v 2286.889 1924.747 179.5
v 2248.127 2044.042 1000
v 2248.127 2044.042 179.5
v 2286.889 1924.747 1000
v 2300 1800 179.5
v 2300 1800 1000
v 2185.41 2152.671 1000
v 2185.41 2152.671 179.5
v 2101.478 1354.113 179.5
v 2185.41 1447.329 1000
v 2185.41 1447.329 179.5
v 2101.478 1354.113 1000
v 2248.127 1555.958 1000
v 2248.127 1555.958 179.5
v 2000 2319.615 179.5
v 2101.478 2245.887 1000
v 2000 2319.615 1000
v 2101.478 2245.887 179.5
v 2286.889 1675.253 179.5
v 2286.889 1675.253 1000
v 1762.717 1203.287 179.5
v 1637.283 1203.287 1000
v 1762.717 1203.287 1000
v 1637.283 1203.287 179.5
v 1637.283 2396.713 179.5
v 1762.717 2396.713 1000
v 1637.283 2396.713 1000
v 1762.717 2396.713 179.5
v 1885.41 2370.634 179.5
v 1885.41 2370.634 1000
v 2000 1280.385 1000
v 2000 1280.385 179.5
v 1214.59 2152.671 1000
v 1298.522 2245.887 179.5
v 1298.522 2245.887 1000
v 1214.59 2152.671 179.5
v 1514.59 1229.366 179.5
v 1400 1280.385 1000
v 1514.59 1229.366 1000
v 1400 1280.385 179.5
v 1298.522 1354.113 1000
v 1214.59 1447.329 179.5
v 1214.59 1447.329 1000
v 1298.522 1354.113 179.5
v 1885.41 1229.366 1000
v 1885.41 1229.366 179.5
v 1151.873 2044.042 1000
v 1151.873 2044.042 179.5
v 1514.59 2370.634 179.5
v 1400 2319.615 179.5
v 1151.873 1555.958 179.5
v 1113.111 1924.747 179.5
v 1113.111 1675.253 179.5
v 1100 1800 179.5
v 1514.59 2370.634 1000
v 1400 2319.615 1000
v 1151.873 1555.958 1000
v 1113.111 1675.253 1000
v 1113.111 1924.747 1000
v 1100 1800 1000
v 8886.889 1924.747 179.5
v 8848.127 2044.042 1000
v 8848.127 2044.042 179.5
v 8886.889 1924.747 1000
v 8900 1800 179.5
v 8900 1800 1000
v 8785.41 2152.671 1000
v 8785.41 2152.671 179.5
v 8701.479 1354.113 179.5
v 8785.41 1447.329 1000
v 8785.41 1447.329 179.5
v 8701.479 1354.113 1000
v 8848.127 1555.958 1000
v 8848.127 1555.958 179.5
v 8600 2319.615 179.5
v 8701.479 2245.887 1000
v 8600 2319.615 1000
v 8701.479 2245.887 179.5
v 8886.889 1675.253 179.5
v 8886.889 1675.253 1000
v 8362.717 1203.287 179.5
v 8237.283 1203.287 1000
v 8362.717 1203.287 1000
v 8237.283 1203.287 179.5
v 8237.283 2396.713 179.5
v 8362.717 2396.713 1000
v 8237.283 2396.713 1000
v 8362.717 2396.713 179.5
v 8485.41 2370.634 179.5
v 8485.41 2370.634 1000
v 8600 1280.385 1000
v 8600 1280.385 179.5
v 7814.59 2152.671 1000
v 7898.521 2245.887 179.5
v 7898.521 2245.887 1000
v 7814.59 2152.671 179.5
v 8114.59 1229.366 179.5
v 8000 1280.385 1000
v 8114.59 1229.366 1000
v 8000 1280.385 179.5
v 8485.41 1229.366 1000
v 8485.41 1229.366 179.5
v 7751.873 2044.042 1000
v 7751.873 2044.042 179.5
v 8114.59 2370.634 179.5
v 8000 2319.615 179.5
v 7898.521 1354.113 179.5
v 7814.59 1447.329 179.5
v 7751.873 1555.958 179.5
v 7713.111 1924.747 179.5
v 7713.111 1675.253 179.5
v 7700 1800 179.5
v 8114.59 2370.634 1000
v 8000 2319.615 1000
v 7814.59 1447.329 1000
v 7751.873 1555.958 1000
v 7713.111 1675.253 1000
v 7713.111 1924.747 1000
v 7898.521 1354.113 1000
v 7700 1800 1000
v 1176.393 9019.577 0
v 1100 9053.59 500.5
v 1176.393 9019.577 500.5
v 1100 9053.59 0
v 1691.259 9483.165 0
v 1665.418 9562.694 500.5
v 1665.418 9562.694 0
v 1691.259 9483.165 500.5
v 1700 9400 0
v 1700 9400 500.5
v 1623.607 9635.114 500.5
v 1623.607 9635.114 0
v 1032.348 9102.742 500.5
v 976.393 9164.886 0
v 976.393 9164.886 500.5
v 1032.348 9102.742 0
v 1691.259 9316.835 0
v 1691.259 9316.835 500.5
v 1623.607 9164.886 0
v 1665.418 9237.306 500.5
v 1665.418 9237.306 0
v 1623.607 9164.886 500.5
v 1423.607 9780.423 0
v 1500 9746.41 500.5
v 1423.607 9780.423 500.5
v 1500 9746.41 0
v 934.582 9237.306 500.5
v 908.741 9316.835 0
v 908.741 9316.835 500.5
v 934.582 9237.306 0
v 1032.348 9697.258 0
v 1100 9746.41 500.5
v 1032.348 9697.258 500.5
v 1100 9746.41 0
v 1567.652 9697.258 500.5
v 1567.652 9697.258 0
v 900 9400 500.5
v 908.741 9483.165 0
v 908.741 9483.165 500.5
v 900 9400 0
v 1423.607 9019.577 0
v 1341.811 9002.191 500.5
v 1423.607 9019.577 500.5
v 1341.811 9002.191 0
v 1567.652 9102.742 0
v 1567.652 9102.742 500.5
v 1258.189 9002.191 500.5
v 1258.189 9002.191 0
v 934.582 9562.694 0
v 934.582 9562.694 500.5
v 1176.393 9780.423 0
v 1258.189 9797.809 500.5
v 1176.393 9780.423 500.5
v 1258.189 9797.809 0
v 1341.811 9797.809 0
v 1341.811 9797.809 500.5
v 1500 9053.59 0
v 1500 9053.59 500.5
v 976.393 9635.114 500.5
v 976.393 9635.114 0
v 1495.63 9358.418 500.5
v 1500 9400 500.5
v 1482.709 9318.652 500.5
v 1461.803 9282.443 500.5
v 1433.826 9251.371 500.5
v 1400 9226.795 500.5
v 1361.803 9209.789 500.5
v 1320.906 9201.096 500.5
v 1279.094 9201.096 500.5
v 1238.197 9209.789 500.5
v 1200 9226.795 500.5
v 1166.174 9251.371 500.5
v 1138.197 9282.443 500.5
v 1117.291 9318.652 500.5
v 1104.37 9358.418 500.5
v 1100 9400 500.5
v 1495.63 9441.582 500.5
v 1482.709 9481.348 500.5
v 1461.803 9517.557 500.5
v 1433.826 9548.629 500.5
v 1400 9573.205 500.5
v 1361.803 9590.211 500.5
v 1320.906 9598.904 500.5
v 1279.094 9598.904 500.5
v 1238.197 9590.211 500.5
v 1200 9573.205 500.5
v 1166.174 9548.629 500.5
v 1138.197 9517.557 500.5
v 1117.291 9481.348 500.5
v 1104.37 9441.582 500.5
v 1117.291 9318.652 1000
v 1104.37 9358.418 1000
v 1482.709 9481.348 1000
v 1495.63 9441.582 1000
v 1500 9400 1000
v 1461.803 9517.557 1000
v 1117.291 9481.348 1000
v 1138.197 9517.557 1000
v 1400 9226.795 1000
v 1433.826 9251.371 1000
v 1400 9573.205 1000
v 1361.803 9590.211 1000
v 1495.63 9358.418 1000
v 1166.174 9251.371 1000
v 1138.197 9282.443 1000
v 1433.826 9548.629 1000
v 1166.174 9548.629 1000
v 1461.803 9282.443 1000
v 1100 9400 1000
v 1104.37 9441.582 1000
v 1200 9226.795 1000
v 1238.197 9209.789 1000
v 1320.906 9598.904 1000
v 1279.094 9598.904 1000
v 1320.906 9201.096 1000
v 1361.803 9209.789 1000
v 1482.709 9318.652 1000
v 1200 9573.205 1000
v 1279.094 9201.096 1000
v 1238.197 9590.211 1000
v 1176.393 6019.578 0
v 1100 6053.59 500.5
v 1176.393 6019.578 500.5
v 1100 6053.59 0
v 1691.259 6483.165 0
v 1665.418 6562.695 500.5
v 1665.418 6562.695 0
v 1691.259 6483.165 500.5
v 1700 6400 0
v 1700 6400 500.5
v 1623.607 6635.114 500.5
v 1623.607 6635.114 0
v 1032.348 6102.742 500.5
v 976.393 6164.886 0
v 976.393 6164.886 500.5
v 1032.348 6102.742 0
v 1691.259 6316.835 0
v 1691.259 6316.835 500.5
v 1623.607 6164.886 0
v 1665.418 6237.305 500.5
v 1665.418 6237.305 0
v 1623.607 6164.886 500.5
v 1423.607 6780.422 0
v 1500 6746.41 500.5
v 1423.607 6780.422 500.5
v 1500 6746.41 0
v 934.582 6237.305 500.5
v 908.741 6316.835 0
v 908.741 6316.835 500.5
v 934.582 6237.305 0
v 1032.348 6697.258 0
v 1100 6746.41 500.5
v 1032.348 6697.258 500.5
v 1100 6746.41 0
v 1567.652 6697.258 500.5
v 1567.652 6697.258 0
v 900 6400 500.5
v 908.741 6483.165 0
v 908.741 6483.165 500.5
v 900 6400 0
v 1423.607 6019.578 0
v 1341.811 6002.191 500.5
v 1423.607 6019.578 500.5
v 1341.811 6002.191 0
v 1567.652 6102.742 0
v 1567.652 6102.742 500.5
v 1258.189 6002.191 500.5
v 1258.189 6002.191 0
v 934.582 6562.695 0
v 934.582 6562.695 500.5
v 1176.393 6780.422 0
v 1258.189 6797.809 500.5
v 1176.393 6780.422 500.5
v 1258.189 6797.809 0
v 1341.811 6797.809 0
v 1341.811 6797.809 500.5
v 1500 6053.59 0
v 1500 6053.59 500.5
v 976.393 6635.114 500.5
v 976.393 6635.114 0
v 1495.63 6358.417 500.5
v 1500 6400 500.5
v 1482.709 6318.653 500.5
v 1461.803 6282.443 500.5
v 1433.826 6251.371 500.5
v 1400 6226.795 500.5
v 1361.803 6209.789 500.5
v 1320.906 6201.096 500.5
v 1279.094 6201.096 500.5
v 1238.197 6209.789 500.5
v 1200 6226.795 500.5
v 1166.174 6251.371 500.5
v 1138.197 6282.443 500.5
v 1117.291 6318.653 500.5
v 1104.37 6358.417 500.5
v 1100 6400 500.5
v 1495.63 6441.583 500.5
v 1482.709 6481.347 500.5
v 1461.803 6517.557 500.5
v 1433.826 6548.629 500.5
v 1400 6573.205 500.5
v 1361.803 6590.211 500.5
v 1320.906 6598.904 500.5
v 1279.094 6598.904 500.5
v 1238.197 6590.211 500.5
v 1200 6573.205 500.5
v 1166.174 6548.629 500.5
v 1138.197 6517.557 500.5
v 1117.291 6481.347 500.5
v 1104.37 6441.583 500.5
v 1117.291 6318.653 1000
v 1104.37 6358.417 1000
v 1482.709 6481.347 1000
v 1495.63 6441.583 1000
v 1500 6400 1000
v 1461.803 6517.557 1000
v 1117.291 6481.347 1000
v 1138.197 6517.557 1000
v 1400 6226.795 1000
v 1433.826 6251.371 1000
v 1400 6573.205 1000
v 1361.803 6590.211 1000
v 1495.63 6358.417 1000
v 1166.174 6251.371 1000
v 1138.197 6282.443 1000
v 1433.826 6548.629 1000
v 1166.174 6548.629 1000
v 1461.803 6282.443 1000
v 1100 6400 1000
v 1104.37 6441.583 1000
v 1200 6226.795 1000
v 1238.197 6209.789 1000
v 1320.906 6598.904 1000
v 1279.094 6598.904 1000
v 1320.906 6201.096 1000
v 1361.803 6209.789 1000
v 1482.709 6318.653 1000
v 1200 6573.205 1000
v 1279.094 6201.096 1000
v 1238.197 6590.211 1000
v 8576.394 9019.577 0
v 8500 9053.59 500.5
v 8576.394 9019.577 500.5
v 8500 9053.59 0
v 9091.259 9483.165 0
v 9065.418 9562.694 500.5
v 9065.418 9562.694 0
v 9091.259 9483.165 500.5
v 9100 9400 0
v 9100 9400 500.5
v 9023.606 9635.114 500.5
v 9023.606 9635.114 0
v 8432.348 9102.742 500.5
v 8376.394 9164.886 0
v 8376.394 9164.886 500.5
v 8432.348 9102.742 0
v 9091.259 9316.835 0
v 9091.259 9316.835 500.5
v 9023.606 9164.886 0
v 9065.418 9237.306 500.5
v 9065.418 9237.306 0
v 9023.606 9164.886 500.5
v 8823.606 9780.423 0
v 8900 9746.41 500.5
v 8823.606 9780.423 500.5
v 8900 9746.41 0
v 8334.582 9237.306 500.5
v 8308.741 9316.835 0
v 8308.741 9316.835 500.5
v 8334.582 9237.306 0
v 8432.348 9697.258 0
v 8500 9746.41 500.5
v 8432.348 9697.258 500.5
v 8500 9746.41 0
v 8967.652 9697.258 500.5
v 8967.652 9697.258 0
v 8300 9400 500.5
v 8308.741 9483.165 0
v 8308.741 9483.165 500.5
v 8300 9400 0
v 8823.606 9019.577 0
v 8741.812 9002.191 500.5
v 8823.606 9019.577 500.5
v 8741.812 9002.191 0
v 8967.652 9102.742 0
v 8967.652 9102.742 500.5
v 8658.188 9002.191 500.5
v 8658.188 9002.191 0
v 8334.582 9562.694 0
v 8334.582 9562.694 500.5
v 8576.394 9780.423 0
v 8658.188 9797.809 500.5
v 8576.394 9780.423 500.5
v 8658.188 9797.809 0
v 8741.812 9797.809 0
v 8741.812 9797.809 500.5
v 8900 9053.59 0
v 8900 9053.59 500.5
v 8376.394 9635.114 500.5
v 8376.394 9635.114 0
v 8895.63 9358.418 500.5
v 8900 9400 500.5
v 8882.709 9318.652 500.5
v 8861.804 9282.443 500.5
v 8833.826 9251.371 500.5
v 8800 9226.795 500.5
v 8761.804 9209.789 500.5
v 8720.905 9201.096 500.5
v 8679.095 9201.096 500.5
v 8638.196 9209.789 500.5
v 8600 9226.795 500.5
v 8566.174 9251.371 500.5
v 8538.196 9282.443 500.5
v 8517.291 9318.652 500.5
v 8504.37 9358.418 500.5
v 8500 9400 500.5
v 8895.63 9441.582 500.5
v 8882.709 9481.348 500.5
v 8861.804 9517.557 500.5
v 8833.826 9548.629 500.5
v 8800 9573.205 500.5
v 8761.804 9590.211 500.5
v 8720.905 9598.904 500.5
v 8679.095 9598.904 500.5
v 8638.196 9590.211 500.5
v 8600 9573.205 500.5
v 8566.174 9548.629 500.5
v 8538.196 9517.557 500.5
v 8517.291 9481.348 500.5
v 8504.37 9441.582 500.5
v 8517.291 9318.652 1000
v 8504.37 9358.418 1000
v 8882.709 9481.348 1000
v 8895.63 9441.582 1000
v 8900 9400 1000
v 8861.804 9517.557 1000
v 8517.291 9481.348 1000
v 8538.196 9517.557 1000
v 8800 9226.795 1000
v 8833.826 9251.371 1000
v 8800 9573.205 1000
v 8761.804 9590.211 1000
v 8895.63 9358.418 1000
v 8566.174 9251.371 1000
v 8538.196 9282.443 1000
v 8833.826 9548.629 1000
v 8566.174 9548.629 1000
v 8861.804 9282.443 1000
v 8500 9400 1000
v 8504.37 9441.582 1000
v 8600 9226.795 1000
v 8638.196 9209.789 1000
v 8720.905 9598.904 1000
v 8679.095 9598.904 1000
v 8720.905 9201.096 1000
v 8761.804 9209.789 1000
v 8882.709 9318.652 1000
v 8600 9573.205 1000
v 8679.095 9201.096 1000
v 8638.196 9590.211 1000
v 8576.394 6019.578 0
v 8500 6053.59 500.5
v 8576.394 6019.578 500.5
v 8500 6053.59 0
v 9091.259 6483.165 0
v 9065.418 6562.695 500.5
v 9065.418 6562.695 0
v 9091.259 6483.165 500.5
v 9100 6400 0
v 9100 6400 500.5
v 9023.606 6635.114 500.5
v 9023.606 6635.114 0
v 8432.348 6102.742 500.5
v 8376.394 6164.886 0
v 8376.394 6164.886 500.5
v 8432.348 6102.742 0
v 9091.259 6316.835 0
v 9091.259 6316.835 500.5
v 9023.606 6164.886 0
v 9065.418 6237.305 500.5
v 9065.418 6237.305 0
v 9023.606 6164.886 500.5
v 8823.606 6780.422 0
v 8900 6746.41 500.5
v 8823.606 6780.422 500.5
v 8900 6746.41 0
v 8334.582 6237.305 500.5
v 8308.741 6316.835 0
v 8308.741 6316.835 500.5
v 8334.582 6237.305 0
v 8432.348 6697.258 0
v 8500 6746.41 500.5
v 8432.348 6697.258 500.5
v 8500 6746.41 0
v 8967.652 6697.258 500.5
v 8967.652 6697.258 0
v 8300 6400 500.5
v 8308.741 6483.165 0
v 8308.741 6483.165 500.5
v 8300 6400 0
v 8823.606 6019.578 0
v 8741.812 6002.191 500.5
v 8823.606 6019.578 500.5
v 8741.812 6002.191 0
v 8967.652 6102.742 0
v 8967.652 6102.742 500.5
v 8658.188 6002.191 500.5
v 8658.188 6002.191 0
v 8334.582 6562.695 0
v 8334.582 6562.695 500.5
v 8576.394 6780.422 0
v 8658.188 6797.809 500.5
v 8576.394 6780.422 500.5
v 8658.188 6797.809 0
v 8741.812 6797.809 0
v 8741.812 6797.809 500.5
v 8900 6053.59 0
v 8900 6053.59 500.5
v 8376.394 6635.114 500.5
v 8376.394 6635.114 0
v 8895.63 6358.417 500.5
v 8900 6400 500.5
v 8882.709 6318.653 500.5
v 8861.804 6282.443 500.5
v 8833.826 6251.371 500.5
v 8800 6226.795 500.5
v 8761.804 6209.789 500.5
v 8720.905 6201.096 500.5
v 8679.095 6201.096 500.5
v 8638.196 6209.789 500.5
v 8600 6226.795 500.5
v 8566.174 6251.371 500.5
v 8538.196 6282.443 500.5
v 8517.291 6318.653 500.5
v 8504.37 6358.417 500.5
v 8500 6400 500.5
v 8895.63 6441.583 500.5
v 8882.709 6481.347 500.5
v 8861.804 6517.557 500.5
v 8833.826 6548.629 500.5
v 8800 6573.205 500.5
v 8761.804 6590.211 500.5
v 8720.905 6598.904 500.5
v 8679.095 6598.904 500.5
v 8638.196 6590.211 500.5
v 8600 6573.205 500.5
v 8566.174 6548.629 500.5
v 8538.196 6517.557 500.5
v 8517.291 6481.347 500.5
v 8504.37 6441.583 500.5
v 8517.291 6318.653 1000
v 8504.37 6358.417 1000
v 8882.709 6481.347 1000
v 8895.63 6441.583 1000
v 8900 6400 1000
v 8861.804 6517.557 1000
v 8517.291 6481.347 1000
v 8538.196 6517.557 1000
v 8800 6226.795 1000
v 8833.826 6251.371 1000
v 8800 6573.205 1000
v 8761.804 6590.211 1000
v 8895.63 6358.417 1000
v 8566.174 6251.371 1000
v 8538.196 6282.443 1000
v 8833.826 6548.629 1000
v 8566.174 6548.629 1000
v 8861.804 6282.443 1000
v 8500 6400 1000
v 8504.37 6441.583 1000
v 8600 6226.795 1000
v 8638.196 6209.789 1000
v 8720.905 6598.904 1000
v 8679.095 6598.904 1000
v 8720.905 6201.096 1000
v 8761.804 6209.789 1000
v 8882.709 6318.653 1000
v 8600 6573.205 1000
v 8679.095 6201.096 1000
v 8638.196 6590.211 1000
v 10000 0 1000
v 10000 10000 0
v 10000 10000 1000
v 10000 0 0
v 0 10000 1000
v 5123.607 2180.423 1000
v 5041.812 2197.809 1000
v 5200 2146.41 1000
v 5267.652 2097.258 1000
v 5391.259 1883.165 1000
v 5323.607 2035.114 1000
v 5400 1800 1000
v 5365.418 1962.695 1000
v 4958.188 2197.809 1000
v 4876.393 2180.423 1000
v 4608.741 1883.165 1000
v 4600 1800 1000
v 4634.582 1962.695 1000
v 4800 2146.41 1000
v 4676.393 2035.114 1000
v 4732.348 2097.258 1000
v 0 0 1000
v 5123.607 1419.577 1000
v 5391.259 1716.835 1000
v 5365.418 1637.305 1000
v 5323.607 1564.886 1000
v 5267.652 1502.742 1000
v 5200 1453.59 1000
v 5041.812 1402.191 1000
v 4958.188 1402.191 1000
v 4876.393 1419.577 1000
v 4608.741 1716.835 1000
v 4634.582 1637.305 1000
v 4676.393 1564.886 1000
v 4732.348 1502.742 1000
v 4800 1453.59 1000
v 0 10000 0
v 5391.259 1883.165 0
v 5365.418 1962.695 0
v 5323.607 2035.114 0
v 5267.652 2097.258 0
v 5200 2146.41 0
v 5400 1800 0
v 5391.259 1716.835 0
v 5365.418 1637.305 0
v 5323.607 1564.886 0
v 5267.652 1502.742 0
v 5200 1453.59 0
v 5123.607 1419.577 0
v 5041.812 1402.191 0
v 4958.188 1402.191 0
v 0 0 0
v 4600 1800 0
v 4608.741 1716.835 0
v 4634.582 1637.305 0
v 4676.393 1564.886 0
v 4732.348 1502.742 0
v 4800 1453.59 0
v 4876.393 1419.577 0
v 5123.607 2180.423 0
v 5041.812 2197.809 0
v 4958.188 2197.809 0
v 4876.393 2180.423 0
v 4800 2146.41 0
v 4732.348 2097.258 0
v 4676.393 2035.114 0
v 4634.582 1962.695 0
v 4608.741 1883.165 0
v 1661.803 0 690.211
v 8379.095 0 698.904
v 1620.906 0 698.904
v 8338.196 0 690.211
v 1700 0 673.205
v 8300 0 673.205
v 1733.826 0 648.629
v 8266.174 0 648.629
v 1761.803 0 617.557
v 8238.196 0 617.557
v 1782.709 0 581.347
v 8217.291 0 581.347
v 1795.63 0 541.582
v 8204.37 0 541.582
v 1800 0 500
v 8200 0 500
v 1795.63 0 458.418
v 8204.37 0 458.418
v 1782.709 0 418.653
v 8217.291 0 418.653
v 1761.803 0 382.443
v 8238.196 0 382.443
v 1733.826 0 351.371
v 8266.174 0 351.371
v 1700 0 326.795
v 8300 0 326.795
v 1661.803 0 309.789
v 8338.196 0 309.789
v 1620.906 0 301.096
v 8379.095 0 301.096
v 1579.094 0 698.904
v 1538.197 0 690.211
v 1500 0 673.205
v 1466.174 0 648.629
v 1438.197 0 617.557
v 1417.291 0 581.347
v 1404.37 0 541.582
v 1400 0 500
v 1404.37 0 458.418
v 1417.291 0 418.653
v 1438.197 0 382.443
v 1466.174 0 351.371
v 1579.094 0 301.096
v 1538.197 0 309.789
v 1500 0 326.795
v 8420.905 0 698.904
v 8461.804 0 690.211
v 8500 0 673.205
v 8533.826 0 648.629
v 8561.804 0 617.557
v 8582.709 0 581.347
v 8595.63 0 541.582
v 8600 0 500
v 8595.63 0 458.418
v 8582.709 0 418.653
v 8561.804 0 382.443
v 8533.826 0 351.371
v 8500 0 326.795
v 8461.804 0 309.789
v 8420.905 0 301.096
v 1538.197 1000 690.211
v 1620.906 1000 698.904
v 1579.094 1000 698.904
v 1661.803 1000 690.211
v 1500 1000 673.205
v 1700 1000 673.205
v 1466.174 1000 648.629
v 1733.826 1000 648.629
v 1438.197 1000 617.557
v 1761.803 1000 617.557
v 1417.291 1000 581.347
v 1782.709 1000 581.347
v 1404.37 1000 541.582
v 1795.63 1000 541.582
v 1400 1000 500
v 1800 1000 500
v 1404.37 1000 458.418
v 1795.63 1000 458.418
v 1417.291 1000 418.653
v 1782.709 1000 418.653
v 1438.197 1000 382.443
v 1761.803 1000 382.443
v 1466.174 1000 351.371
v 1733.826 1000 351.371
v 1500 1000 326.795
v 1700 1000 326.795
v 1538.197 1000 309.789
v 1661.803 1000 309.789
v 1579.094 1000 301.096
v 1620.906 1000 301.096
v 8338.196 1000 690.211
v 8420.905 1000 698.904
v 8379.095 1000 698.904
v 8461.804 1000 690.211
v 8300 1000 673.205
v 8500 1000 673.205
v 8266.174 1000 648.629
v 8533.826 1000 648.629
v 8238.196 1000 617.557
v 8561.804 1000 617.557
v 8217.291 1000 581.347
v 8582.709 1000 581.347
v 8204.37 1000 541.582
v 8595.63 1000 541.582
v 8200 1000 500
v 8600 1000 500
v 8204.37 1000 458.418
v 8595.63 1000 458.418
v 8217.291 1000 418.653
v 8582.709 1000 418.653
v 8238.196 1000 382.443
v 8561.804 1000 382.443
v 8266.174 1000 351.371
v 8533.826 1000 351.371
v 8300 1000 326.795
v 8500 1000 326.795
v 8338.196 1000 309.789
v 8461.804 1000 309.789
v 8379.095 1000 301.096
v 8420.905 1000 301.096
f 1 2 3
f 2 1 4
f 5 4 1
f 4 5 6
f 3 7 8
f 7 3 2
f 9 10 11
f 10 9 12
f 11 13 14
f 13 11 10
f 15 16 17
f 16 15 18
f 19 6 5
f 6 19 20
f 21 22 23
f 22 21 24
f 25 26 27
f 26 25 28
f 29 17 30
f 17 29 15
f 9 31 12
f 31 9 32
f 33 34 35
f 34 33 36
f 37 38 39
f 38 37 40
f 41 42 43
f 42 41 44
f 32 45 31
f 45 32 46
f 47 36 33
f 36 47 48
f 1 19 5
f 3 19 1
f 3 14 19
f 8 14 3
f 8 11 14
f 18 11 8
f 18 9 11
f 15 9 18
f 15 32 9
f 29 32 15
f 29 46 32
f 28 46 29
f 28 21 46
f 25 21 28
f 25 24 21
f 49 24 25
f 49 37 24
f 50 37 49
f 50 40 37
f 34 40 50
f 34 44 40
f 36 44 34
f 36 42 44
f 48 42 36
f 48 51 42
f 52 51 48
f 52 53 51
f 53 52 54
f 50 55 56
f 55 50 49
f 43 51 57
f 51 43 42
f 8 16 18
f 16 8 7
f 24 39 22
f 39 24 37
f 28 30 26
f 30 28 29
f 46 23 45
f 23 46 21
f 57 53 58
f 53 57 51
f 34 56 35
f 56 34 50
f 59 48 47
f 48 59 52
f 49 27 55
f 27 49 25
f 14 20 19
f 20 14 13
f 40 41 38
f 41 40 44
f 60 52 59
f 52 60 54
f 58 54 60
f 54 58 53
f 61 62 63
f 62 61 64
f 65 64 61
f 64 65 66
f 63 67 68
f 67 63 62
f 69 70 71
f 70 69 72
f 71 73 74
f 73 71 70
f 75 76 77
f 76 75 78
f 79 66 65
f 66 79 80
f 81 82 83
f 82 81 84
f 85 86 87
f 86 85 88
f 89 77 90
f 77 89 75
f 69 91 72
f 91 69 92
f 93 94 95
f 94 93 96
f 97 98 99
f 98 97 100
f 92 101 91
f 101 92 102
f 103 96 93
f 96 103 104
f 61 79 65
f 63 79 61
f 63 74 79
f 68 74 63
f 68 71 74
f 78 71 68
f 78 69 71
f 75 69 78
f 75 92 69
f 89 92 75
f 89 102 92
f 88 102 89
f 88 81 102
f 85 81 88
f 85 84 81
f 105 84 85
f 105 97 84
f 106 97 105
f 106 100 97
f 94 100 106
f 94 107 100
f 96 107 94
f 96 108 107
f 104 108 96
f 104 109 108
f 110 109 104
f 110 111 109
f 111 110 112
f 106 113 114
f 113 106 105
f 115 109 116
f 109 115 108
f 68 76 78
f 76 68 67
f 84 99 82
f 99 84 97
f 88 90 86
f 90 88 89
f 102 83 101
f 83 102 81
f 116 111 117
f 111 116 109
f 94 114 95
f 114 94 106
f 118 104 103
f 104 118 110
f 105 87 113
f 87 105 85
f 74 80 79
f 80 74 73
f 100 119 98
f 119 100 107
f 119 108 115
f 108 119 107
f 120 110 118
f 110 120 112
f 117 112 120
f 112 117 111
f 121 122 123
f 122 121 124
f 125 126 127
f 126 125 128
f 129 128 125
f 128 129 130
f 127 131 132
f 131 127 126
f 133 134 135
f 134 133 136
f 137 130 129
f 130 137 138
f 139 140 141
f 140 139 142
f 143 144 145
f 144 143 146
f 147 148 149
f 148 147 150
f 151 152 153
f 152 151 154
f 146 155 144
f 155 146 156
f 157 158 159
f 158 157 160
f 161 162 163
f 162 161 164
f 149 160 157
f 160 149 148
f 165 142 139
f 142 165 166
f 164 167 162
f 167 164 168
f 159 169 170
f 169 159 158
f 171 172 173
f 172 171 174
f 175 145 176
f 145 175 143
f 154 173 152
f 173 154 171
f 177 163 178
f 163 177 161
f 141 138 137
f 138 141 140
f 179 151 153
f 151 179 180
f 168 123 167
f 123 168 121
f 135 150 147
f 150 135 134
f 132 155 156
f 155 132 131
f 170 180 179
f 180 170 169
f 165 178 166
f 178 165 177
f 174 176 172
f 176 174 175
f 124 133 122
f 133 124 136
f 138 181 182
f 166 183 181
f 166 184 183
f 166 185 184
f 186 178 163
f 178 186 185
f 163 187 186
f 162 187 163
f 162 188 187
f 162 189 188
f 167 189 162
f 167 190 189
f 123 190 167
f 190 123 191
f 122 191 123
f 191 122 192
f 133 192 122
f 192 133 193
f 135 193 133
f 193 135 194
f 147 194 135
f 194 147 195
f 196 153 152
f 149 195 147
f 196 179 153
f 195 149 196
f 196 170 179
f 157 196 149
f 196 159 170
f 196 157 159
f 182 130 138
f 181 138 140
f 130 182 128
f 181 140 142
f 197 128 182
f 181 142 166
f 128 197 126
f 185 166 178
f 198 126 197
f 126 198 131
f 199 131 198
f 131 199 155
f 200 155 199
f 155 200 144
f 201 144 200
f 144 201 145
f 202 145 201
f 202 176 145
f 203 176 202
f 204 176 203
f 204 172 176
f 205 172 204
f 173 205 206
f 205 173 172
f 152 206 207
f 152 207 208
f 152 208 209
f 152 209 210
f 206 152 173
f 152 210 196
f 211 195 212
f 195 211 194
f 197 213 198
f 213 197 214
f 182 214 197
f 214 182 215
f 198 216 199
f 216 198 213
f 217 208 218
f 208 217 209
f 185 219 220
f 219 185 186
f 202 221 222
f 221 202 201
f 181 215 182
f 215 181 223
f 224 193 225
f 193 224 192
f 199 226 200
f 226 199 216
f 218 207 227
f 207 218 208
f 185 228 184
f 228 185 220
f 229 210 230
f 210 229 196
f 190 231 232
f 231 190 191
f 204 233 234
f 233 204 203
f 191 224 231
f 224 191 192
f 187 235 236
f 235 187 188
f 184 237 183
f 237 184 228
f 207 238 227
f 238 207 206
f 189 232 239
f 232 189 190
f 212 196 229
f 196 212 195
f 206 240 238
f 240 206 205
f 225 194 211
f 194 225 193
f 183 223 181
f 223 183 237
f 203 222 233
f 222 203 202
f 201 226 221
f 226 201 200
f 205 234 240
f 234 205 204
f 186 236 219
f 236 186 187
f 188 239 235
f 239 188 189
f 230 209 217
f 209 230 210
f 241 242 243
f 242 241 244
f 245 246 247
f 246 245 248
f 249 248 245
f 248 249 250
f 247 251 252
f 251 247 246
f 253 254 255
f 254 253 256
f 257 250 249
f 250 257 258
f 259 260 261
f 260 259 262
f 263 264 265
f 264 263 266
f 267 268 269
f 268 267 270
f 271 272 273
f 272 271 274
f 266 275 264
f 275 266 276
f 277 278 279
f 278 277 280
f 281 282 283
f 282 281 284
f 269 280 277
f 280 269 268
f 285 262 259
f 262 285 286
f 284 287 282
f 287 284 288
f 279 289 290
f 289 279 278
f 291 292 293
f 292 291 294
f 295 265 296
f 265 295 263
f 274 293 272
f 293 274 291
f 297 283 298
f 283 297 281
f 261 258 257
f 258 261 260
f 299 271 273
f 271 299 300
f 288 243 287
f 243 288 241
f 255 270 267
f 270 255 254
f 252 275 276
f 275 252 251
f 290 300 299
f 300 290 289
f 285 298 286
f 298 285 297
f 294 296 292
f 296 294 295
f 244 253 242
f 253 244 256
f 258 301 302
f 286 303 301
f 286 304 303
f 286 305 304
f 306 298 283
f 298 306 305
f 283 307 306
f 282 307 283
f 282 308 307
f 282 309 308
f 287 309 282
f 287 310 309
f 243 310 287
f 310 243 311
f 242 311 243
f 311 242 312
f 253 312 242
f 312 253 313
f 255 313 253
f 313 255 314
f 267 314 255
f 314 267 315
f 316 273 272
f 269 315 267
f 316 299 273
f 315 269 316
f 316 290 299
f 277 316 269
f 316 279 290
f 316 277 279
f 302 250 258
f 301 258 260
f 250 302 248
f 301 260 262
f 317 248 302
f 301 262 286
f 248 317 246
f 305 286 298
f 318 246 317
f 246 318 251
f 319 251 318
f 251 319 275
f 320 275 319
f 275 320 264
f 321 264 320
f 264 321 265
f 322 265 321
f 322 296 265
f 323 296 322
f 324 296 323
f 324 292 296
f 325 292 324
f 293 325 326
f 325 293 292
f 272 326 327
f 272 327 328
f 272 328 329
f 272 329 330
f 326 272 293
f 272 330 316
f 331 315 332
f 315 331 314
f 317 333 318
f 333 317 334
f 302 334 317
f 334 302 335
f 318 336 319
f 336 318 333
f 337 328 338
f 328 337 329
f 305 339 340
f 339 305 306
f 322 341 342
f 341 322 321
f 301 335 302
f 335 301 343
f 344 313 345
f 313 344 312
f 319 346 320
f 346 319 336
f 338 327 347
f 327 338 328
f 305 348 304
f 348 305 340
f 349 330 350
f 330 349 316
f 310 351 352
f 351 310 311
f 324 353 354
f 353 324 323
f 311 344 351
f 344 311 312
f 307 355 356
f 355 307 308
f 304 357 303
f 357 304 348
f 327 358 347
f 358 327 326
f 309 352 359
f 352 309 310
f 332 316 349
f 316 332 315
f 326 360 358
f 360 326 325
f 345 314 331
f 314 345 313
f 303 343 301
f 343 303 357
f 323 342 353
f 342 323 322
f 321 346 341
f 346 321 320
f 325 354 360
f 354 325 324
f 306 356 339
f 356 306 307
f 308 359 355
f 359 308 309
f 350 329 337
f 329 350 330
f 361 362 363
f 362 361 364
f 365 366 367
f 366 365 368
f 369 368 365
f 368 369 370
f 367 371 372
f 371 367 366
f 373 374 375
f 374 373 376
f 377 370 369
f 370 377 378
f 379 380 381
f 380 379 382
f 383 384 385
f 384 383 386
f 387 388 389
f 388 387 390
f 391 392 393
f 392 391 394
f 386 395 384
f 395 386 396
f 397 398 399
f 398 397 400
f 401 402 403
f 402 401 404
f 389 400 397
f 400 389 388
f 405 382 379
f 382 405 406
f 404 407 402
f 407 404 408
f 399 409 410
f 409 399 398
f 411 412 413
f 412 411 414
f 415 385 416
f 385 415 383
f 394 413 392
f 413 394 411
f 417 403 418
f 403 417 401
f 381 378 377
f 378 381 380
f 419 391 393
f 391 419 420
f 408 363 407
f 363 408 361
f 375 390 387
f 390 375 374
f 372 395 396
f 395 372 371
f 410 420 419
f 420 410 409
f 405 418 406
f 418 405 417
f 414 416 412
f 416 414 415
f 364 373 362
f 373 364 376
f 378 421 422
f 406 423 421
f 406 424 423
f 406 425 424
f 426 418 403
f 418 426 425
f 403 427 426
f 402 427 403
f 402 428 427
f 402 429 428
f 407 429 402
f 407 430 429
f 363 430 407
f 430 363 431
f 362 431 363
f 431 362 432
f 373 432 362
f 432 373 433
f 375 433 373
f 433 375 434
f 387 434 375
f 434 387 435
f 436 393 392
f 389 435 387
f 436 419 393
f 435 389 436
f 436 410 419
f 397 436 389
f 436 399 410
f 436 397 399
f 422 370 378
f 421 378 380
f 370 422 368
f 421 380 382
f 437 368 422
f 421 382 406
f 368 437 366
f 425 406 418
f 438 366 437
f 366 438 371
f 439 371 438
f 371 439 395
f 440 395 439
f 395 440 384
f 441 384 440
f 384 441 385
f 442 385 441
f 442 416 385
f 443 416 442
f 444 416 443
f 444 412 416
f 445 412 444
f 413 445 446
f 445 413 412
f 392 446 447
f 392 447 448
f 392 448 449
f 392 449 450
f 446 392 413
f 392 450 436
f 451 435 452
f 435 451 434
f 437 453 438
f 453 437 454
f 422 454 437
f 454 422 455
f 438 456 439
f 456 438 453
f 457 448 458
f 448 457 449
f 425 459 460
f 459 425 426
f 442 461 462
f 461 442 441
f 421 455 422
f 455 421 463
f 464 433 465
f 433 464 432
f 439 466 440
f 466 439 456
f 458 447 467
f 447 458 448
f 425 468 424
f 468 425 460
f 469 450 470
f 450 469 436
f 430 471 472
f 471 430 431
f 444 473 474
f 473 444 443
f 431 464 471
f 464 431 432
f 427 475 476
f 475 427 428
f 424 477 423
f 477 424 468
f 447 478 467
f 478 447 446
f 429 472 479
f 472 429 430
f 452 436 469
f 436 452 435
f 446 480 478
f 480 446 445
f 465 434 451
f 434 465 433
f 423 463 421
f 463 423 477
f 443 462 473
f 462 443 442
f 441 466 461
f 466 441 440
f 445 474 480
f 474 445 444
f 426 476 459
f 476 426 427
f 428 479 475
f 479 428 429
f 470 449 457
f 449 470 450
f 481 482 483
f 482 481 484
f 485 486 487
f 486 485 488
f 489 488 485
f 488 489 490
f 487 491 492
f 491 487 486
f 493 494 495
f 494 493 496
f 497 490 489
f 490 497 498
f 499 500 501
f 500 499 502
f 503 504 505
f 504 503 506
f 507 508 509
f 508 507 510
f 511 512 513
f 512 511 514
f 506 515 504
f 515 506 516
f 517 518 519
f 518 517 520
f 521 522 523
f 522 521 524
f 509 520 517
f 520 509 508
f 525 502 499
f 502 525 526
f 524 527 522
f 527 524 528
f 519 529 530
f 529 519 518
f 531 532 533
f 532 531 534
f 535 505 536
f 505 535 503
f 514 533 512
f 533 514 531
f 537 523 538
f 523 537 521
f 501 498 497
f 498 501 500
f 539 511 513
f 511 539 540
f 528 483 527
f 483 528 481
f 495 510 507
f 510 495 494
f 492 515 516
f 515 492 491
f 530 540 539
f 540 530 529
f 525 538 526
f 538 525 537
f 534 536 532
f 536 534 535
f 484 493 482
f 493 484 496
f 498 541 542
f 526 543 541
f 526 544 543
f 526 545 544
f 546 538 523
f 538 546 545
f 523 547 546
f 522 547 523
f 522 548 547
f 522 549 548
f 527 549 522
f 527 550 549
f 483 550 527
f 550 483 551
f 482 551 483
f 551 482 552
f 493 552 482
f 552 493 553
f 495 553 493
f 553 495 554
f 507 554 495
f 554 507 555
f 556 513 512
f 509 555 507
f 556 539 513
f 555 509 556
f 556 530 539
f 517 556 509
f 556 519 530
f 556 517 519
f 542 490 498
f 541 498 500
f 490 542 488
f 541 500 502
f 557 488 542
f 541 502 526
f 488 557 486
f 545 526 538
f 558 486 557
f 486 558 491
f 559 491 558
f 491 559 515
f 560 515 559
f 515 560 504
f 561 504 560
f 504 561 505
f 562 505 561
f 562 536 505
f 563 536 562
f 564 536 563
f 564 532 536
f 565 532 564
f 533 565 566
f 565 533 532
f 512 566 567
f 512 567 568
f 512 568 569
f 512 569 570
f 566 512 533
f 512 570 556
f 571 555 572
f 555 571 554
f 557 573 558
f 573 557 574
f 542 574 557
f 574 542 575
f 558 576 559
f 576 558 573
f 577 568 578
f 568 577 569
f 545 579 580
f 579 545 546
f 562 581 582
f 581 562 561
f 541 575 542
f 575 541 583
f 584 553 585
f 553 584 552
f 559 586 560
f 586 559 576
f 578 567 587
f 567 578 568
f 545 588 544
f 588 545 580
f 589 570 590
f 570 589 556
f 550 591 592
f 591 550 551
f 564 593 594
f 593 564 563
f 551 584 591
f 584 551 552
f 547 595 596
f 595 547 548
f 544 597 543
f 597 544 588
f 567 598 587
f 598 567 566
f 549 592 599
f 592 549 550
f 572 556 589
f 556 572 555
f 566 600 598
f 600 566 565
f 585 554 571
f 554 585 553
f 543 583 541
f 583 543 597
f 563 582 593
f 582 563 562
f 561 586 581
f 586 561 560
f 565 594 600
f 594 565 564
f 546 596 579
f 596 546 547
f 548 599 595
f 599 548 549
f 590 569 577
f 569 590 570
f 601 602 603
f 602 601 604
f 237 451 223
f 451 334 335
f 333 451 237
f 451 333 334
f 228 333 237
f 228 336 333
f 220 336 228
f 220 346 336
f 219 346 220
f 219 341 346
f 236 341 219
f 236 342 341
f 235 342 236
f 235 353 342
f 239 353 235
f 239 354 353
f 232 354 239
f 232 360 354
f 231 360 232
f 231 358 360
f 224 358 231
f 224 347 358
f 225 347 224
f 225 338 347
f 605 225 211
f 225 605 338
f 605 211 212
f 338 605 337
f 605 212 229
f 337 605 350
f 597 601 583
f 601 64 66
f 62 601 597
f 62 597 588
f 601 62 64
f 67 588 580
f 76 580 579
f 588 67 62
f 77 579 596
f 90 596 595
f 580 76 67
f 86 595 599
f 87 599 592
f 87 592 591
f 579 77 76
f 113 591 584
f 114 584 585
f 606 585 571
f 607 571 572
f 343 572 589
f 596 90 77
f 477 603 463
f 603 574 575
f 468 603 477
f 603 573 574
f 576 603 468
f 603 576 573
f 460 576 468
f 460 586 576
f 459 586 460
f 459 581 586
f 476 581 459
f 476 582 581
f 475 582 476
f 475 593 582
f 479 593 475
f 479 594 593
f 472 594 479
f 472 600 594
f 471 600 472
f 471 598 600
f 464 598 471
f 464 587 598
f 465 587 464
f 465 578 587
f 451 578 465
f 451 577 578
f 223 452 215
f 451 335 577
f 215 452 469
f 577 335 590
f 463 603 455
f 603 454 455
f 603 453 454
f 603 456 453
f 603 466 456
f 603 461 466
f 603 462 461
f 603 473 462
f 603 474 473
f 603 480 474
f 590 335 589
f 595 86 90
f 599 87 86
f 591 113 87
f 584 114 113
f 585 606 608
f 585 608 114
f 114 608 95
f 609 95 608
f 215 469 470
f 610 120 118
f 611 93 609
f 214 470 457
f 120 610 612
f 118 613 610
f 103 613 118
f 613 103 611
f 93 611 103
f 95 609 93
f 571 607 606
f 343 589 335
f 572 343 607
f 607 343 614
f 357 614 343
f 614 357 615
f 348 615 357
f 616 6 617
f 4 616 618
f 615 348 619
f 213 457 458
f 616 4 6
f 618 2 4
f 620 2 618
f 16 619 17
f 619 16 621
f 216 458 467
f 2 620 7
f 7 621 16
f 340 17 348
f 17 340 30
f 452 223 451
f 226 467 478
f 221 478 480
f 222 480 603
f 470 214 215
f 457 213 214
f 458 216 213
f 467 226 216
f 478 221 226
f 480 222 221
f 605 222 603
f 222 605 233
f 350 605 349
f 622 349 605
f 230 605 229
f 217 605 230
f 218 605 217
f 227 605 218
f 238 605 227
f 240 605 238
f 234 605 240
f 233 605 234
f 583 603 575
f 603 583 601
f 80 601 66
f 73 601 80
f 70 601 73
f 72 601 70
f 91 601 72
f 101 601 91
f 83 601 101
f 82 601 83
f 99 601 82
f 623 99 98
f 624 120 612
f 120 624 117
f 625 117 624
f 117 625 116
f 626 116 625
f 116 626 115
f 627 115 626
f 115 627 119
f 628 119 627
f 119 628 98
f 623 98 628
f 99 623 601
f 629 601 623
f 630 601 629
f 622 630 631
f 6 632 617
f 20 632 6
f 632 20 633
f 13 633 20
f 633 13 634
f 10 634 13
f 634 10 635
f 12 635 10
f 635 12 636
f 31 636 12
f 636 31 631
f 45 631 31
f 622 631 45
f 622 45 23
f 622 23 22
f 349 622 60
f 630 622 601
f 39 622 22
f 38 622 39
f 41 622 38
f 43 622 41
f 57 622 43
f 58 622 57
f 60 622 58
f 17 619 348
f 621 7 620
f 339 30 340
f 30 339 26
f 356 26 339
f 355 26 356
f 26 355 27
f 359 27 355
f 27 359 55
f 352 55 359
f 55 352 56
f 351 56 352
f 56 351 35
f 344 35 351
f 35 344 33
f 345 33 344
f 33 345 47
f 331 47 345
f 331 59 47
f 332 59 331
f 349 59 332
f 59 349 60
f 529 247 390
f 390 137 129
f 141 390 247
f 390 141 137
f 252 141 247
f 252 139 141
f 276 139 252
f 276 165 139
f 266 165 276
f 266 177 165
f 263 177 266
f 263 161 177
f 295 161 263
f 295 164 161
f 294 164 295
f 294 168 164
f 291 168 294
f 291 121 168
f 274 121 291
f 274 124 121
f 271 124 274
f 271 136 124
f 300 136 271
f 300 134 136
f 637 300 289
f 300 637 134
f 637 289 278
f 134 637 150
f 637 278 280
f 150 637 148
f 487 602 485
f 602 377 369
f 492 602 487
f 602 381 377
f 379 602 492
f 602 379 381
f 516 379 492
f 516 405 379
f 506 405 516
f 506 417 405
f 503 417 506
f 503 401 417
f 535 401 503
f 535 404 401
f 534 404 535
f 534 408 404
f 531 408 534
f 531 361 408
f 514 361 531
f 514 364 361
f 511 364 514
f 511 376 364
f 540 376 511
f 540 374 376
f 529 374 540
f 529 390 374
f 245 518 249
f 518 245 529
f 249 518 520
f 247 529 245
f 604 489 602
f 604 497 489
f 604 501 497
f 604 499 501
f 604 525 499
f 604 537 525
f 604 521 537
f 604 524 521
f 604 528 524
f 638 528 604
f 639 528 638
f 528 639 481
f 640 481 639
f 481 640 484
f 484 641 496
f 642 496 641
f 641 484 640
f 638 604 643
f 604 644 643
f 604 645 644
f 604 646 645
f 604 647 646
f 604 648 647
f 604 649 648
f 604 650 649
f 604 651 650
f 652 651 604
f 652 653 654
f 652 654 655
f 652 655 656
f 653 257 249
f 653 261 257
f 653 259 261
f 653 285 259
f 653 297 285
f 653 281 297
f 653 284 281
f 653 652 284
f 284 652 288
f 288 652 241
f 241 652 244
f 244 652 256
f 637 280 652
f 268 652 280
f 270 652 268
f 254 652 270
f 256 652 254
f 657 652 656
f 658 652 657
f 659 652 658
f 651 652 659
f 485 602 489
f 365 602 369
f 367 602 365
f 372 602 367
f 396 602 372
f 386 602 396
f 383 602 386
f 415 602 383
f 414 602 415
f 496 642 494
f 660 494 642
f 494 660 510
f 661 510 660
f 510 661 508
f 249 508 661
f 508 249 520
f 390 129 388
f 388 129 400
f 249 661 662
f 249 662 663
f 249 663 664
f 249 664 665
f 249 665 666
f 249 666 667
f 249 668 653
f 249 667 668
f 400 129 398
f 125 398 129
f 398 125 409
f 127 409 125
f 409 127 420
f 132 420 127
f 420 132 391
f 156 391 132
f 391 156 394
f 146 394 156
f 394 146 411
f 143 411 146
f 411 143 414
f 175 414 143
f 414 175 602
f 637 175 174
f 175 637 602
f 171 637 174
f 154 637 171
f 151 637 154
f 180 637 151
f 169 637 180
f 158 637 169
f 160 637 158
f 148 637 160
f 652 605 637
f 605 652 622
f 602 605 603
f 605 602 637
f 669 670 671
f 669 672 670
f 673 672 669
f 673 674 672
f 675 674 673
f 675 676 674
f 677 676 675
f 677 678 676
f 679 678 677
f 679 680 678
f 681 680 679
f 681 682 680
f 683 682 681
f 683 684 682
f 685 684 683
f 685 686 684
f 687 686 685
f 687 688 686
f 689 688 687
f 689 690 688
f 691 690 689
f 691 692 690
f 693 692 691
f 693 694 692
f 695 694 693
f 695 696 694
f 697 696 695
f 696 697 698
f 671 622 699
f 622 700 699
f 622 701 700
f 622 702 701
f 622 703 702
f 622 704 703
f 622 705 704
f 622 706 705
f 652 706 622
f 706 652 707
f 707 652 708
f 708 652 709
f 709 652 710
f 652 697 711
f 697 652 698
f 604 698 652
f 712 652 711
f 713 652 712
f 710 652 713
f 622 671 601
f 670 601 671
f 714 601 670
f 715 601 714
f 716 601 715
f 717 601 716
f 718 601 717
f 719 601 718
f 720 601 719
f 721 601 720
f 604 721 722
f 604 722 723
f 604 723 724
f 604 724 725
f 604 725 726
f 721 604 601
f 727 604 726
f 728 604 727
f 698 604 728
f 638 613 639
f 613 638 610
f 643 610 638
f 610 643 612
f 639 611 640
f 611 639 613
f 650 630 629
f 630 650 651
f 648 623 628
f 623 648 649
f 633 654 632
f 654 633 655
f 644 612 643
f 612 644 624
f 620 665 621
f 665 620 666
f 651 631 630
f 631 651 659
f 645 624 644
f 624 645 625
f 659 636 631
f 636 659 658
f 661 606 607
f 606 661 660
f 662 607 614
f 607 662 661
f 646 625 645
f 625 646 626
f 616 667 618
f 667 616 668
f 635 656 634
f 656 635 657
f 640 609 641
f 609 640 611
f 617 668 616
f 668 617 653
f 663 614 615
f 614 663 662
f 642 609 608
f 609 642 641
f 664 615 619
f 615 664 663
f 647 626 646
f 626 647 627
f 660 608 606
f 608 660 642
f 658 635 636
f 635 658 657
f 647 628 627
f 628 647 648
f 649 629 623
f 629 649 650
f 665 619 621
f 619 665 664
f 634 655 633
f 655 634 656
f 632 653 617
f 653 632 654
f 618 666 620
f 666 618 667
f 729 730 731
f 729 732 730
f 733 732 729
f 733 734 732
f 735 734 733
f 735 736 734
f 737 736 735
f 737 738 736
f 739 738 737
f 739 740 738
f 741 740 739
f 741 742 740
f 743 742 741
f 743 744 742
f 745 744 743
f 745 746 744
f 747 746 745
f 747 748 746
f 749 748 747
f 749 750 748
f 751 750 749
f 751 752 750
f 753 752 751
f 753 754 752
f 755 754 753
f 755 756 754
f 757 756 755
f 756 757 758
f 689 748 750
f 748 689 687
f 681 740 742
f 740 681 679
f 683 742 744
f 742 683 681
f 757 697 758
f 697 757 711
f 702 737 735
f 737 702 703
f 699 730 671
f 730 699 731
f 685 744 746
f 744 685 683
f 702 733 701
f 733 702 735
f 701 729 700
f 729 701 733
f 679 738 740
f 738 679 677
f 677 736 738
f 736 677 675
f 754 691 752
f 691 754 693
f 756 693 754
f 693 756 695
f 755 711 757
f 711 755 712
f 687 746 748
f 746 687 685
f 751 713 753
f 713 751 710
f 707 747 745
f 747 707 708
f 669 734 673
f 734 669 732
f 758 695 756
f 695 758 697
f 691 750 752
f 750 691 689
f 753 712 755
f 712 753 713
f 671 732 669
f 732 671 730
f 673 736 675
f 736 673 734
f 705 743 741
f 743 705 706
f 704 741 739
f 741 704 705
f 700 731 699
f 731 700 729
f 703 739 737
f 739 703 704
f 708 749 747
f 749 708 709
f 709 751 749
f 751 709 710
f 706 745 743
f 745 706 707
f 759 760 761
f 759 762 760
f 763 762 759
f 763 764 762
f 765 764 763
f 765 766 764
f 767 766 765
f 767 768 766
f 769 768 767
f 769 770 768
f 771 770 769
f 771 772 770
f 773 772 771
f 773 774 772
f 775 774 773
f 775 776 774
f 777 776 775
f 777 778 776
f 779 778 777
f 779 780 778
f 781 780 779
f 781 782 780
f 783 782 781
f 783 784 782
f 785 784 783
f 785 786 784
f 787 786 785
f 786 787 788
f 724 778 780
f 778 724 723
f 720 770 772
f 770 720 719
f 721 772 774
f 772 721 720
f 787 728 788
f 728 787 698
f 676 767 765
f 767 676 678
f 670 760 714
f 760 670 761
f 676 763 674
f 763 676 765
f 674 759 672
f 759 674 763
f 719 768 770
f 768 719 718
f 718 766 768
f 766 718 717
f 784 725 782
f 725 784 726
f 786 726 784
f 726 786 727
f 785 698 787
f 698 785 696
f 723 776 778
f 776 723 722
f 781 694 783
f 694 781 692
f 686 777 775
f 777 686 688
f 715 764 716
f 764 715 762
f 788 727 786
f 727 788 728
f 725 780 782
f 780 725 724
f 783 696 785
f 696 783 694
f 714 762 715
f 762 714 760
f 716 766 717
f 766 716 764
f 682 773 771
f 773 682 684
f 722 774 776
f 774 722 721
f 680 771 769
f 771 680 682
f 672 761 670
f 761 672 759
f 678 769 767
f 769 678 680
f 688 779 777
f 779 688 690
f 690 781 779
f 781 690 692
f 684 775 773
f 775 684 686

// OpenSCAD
// file: ../common/holes.scad
module countersunk_hole(h, d, r_inner, r_outer, center=true) {
  centroid = center ? [0, 0, 0] : [r_outer, r_outer, h / 2];
  translate(centroid) {
    translate([0, 0, (h - d) / 2]) cylinder(r=r_outer, h=d + 1, center=true);
    cylinder(r=r_inner, h=h + 1, center=true);
  }
}

module circle_mount(r_mount, r_hole, h) {
  translate([0, r_mount, 0]) cylinder(r=r_hole, h=h + 1, center=true);
  translate([0, -r_mount, 0]) cylinder(r=r_hole, h=h + 1, center=true);
  translate([r_mount, 0, 0]) cylinder(r=r_hole, h=h + 1, center=true);
  translate([-r_mount, 0, 0]) cylinder(r=r_hole, h=h + 1, center=true);
}

module square_mount(r_mount, r_hole, h) {
  translate([r_mount, r_mount, 0]) cylinder(r=r_hole, h=h + 1, center=true);
  translate([r_mount, -r_mount, 0]) cylinder(r=r_hole, h=h + 1, center=true);
  translate([-r_mount, r_mount, 0]) cylinder(r=r_hole, h=h + 1, center=true);
  translate([-r_mount, -r_mount, 0]) cylinder(r=r_hole, h=h + 1, center=true);
}

module mirror_drilling(axis=[1, 0, 0]) {
  children();
  mirror(axis) children();
}

module quad_drilling(axis=[0, 0, 1]) {
  children();
  mirror([1, 0, 0]) children();
  mirror(axis) {
    children();
    mirror([1, 0, 0]) children();
  }
}
// file: ZAxisPlateDrilling.scad
use <../common/holes.scad>;

module ZAxisPlateDrilling(w, l, h) {
  translate([0, 0, h / 2]) {
    translate([1300, l - 600, 0]) countersunk_hole(h=h, d=500, r_inner=200, r_outer=400);
    translate([1300, l - 600 - 3000, 0]) countersunk_hole(h=h, d=500, r_inner=200, r_outer=400);
    translate([w - 1300, l - 600, 0]) countersunk_hole(h=h, d=500, r_inner=200, r_outer=400);
    translate([w - 1300, l - 600 - 3000, 0]) countersunk_hole(h=h, d=500, r_inner=200, r_outer=400);
  }
}
// main file
use <ZAxisPlateDrilling.scad>;

module ZAxisBottomPlate(w=10000, l=10000, h=1000, rodD=820) {
  rodY = 3000 - 1200;
  spindleMountWidth = 1200;

  difference() {
    cube([w, l, h]);

    translate([w / 2, rodY, h / 2]) {
      cylinder(r=400, h=h + 1, center=true);
    }

    translate([0, rodY, h - rodD / 2]) {
      translate([1700, 0, 0]) cylinder(r=600, h=rodD + 1, center=true);
      translate([w - 1700, 0, 0]) cylinder(r=600, h=rodD + 1, center=true);
    }

    mirror([0, 1, 0]) translate([0, 0, h]) rotate([180, 0, 0]) ZAxisPlateDrilling(w, l, h);

    frontHoleR = 200;
    frontHoleX = spindleMountWidth + frontHoleR * 2;
    translate([frontHoleX, 0, h / 2]) rotate([90, 0, 0]) {
      cylinder(r=frontHoleR, h=2000, center=true);
    }
    translate([w - frontHoleX, 0, h / 2]) rotate([90, 0, 0]) {
      cylinder(r=frontHoleR, h=2000, center=true);
    }
  }
}

ZAxisBottomPlate();
